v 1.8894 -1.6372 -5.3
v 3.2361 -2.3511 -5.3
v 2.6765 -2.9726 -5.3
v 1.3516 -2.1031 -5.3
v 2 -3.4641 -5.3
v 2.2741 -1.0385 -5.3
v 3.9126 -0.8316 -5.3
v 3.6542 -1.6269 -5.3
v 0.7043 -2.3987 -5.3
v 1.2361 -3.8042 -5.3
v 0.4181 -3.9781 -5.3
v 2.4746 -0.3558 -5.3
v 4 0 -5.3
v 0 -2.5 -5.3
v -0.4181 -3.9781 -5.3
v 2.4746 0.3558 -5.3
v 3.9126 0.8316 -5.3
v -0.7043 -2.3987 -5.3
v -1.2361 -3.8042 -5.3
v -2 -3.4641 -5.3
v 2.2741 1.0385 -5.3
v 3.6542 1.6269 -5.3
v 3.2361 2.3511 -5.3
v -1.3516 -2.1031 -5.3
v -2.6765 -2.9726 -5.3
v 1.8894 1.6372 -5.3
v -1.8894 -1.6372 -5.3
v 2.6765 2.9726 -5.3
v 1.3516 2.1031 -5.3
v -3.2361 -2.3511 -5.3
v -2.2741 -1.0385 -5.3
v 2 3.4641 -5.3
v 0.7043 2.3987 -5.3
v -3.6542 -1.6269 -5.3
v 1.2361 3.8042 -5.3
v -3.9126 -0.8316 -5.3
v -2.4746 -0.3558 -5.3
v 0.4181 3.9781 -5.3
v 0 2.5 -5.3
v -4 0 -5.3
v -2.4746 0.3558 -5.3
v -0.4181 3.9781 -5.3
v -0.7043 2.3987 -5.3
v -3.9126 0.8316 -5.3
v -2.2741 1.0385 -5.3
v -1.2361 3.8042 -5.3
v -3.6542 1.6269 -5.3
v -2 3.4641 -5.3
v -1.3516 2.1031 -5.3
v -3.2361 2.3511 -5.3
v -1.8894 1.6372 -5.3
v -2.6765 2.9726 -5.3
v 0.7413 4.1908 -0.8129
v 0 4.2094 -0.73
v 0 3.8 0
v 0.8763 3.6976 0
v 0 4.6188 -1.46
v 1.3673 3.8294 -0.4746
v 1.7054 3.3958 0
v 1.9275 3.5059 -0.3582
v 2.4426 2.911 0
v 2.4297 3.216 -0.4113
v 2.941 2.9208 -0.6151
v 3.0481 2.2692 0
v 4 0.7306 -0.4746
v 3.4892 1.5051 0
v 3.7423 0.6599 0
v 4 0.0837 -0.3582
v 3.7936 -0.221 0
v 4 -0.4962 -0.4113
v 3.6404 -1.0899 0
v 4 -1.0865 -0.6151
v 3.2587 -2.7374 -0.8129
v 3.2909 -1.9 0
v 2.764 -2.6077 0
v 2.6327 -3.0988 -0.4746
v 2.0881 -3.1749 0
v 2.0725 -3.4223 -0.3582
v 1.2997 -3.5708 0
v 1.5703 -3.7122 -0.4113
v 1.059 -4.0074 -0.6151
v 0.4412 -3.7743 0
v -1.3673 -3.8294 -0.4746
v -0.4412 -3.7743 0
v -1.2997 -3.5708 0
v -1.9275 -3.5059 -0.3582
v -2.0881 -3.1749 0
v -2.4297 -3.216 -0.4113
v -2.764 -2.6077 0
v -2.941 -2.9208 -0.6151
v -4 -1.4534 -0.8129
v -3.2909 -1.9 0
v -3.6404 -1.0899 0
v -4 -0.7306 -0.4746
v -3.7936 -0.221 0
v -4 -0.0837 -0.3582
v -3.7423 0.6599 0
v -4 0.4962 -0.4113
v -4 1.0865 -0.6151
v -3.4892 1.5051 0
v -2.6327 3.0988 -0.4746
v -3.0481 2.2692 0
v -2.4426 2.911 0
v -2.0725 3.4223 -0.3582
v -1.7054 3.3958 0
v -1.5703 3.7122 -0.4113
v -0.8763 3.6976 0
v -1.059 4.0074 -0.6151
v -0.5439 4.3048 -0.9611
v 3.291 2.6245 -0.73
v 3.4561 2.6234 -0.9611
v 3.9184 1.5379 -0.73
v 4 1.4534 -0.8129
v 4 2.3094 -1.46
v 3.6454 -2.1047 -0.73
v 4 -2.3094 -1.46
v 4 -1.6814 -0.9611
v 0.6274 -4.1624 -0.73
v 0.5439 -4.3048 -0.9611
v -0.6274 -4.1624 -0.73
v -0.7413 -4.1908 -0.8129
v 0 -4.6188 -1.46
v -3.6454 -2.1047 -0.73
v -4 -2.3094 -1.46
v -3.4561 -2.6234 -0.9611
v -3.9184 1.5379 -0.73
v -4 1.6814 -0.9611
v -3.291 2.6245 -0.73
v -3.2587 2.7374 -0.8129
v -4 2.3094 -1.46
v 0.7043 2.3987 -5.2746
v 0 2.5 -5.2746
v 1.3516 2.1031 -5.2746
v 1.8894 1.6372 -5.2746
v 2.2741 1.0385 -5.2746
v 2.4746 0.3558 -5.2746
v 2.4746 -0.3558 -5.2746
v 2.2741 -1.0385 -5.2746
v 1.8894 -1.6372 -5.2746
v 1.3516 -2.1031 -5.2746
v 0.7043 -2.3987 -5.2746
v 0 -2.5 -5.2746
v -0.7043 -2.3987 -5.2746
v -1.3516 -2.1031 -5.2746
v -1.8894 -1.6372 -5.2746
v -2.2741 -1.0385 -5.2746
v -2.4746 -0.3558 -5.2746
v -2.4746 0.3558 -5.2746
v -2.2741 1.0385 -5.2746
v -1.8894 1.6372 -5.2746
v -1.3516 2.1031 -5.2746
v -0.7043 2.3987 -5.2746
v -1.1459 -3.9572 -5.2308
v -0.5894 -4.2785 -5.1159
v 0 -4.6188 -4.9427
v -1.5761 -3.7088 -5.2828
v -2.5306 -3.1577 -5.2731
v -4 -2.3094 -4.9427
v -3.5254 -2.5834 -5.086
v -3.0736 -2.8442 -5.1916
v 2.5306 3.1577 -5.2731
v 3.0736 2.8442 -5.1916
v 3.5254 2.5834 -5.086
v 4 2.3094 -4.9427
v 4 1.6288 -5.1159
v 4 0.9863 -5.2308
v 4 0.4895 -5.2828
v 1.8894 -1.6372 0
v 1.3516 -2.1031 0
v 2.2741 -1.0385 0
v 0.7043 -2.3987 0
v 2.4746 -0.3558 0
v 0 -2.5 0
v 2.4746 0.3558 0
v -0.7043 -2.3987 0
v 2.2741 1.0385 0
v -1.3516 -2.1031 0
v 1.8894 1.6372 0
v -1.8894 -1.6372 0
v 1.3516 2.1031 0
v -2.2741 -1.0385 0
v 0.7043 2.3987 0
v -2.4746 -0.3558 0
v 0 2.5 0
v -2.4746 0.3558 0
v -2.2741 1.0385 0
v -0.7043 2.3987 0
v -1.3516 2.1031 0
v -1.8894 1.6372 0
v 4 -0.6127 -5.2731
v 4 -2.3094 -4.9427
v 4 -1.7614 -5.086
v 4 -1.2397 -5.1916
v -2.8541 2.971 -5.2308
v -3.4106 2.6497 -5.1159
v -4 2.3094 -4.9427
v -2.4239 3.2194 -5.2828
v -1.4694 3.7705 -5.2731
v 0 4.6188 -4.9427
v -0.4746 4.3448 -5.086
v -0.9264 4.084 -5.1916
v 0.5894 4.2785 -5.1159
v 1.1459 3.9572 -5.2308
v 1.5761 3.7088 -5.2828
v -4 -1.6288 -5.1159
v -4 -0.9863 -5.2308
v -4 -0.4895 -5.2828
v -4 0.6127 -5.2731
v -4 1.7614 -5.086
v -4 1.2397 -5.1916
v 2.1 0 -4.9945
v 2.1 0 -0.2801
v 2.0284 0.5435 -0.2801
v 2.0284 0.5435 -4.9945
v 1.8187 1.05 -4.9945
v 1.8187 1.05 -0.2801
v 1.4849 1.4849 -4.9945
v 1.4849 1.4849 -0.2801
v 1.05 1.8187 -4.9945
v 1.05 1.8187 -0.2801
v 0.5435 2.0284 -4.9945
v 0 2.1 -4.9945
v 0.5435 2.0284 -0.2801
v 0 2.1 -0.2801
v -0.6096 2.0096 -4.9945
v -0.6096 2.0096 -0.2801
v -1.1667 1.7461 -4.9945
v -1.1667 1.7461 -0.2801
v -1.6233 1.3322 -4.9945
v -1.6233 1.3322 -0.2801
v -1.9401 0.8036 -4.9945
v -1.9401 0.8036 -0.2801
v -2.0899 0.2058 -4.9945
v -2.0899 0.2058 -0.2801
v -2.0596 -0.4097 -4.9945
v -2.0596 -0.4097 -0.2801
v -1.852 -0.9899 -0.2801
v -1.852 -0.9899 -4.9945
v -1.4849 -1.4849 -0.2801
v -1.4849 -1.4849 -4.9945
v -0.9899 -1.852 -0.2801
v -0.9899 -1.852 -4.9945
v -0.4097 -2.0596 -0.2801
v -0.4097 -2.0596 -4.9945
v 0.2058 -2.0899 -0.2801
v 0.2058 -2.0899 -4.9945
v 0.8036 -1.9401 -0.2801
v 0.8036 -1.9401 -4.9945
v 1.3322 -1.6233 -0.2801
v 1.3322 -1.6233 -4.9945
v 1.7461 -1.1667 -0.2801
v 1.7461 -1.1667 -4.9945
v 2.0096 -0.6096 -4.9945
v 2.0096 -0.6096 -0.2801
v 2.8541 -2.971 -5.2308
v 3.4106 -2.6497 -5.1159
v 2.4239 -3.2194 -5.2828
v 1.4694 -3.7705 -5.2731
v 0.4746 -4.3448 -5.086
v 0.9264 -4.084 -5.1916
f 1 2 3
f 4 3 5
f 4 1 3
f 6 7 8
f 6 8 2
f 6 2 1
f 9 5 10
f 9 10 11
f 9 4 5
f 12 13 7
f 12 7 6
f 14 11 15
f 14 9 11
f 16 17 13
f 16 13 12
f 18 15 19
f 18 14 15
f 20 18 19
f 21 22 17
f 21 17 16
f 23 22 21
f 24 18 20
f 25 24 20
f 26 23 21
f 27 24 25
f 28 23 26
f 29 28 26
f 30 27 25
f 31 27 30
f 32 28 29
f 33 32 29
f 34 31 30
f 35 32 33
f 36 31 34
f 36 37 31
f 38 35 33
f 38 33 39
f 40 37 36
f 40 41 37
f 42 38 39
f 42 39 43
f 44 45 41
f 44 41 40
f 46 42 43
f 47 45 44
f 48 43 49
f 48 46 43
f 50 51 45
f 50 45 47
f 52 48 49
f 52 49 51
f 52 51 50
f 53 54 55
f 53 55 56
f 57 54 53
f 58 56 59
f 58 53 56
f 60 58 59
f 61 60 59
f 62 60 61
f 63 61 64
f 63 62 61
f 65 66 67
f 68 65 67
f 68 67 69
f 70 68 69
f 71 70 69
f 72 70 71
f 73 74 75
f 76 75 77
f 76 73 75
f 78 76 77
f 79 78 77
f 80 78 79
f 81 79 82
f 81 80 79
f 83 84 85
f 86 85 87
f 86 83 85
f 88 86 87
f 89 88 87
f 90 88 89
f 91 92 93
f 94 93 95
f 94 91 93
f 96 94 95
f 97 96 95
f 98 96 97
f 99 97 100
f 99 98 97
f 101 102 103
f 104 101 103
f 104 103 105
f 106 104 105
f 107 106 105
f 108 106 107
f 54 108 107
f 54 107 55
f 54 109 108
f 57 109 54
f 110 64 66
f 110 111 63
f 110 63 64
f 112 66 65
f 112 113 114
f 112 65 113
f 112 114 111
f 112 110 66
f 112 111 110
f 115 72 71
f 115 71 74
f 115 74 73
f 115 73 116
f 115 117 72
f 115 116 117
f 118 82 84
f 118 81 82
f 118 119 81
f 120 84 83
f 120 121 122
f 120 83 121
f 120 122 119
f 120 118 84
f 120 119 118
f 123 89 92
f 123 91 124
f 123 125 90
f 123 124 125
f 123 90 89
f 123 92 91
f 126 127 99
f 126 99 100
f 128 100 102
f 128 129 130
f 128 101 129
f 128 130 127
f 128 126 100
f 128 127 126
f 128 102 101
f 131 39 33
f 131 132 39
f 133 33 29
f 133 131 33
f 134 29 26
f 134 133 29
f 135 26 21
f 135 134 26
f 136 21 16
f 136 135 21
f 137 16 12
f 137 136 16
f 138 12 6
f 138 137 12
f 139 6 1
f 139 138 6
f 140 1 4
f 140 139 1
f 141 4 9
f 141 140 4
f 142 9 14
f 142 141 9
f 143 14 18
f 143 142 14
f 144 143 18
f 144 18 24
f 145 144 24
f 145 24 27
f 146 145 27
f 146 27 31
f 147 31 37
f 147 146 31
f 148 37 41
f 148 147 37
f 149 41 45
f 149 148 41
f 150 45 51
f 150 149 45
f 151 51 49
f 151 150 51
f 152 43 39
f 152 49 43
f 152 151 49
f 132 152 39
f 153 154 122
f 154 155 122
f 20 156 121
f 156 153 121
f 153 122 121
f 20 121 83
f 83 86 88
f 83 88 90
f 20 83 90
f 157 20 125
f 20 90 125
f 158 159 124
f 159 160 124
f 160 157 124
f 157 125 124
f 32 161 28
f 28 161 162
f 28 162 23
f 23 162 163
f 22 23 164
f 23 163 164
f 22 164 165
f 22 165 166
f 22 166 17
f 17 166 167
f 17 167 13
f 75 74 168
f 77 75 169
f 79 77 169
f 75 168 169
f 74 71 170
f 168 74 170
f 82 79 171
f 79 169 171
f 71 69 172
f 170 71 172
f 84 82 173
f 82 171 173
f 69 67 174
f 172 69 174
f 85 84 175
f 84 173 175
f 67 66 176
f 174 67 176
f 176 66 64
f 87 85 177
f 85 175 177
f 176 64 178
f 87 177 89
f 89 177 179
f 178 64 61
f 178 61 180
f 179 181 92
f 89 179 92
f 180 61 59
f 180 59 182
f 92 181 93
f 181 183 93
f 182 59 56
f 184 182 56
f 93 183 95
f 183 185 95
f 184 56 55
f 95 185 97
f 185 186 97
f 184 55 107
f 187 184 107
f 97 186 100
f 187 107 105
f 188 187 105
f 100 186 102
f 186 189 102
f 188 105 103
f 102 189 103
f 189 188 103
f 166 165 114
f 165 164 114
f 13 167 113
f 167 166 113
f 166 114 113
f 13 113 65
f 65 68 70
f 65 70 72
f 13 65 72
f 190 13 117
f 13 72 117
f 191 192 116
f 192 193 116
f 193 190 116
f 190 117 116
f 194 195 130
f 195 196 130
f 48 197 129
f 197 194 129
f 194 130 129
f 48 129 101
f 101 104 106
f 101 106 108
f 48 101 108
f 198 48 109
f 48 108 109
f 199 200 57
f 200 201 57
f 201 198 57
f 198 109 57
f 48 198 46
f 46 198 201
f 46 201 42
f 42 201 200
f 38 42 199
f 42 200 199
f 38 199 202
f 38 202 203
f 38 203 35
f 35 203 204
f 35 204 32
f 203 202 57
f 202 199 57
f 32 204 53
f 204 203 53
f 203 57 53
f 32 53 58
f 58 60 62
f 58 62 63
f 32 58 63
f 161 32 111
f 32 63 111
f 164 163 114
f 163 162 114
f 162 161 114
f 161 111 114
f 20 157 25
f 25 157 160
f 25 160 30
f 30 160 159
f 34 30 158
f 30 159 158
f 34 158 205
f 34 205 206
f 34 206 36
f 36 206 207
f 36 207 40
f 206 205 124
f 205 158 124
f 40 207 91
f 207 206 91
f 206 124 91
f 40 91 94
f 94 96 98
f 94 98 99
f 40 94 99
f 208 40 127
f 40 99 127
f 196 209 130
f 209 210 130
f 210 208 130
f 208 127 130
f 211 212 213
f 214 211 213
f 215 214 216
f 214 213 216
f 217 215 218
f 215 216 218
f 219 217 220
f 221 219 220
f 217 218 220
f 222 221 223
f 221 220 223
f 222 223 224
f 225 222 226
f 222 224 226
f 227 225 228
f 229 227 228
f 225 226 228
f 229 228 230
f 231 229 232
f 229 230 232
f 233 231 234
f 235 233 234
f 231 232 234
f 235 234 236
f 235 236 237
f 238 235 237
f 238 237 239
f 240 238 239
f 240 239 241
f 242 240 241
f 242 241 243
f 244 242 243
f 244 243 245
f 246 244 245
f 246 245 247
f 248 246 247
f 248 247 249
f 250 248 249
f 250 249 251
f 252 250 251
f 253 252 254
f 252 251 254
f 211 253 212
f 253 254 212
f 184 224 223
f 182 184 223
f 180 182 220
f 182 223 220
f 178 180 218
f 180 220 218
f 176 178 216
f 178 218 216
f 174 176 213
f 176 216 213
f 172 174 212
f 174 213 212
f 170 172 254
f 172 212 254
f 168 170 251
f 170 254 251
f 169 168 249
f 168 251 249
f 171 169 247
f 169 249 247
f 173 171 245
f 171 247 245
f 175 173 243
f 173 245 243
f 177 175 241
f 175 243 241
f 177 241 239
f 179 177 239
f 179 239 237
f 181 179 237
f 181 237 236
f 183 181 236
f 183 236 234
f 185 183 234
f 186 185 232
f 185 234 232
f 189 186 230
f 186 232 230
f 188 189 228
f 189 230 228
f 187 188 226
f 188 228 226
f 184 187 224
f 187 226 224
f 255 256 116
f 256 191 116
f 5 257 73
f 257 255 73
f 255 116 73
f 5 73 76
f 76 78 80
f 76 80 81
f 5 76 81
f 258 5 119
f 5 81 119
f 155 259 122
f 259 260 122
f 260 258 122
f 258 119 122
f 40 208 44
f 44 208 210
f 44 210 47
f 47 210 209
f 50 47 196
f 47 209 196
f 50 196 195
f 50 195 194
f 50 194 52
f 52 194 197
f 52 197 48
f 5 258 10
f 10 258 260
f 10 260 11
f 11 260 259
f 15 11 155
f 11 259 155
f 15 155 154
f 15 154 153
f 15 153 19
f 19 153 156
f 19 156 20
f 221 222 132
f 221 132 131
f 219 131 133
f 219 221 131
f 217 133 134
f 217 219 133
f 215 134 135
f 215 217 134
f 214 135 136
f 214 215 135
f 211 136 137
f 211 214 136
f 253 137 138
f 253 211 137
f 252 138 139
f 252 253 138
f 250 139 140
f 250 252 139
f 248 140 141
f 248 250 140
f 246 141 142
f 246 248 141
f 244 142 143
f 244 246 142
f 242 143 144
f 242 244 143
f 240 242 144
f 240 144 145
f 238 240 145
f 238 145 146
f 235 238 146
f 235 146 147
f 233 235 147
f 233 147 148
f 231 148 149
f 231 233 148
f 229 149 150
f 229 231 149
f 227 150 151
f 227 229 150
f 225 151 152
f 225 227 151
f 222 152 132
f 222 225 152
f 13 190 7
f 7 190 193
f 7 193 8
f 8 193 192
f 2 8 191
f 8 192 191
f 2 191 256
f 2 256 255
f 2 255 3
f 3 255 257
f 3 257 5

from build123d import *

# Parameters (mm, degrees)
BASENUTSKE_R  = 2.1
BASENUT_DEPTH = 5.3


with BuildPart() as part:
    # BaseNutSke → BaseNut (new body)
    with BuildSketch(Plane.XY):
        Polygon((4, 2.309401077), (4, -2.309401077), (0, -4.618802154), (-4, -2.309401077), (-4, 2.309401077), (0, 4.618802154), align=None)
        Circle(BASENUTSKE_R, mode=Mode.SUBTRACT)
    extrude(amount=-BASENUT_DEPTH)

    # Sketch3 → Double-Chamfer (revolve, cut)
    with BuildSketch(Plane(origin=(0, 0, 0), x_dir=(0, 0, -1), z_dir=(1, 0, 0))):
        Polygon((5.3, 4), (4.94273441, 4.618802154), (4.94273441, 14.618802154), (15.3, 14.618802154), (15.3, 4), align=None)
        Polygon((1.46, 14.618802154), (-10, 14.618802154), (-10, 3.8), (0, 3.8), (1.46, 4.618802154), align=None)
    revolve(axis=Axis((0, 0, 0), (0, 0, -1)), mode=Mode.SUBTRACT)

    # Sketch5 → EndChamfer (revolve, cut)
    with BuildSketch(Plane(origin=(0, 0, 0), x_dir=(0, 0, -1), z_dir=(1, 0, 0))):
        Polygon((5.2746, 2.5), (4.966508683, 2.06), (5.3254, 2.06), (5.3254, 2.5), align=None)
        Polygon((-0.0508, 2.5), (0, 2.5), (0.308091317, 2.06), (-0.0508, 2.06), align=None)
    revolve(axis=Axis((0, 0, -25.037505729), (0, 0, -1)), mode=Mode.SUBTRACT)


solid = part.part
